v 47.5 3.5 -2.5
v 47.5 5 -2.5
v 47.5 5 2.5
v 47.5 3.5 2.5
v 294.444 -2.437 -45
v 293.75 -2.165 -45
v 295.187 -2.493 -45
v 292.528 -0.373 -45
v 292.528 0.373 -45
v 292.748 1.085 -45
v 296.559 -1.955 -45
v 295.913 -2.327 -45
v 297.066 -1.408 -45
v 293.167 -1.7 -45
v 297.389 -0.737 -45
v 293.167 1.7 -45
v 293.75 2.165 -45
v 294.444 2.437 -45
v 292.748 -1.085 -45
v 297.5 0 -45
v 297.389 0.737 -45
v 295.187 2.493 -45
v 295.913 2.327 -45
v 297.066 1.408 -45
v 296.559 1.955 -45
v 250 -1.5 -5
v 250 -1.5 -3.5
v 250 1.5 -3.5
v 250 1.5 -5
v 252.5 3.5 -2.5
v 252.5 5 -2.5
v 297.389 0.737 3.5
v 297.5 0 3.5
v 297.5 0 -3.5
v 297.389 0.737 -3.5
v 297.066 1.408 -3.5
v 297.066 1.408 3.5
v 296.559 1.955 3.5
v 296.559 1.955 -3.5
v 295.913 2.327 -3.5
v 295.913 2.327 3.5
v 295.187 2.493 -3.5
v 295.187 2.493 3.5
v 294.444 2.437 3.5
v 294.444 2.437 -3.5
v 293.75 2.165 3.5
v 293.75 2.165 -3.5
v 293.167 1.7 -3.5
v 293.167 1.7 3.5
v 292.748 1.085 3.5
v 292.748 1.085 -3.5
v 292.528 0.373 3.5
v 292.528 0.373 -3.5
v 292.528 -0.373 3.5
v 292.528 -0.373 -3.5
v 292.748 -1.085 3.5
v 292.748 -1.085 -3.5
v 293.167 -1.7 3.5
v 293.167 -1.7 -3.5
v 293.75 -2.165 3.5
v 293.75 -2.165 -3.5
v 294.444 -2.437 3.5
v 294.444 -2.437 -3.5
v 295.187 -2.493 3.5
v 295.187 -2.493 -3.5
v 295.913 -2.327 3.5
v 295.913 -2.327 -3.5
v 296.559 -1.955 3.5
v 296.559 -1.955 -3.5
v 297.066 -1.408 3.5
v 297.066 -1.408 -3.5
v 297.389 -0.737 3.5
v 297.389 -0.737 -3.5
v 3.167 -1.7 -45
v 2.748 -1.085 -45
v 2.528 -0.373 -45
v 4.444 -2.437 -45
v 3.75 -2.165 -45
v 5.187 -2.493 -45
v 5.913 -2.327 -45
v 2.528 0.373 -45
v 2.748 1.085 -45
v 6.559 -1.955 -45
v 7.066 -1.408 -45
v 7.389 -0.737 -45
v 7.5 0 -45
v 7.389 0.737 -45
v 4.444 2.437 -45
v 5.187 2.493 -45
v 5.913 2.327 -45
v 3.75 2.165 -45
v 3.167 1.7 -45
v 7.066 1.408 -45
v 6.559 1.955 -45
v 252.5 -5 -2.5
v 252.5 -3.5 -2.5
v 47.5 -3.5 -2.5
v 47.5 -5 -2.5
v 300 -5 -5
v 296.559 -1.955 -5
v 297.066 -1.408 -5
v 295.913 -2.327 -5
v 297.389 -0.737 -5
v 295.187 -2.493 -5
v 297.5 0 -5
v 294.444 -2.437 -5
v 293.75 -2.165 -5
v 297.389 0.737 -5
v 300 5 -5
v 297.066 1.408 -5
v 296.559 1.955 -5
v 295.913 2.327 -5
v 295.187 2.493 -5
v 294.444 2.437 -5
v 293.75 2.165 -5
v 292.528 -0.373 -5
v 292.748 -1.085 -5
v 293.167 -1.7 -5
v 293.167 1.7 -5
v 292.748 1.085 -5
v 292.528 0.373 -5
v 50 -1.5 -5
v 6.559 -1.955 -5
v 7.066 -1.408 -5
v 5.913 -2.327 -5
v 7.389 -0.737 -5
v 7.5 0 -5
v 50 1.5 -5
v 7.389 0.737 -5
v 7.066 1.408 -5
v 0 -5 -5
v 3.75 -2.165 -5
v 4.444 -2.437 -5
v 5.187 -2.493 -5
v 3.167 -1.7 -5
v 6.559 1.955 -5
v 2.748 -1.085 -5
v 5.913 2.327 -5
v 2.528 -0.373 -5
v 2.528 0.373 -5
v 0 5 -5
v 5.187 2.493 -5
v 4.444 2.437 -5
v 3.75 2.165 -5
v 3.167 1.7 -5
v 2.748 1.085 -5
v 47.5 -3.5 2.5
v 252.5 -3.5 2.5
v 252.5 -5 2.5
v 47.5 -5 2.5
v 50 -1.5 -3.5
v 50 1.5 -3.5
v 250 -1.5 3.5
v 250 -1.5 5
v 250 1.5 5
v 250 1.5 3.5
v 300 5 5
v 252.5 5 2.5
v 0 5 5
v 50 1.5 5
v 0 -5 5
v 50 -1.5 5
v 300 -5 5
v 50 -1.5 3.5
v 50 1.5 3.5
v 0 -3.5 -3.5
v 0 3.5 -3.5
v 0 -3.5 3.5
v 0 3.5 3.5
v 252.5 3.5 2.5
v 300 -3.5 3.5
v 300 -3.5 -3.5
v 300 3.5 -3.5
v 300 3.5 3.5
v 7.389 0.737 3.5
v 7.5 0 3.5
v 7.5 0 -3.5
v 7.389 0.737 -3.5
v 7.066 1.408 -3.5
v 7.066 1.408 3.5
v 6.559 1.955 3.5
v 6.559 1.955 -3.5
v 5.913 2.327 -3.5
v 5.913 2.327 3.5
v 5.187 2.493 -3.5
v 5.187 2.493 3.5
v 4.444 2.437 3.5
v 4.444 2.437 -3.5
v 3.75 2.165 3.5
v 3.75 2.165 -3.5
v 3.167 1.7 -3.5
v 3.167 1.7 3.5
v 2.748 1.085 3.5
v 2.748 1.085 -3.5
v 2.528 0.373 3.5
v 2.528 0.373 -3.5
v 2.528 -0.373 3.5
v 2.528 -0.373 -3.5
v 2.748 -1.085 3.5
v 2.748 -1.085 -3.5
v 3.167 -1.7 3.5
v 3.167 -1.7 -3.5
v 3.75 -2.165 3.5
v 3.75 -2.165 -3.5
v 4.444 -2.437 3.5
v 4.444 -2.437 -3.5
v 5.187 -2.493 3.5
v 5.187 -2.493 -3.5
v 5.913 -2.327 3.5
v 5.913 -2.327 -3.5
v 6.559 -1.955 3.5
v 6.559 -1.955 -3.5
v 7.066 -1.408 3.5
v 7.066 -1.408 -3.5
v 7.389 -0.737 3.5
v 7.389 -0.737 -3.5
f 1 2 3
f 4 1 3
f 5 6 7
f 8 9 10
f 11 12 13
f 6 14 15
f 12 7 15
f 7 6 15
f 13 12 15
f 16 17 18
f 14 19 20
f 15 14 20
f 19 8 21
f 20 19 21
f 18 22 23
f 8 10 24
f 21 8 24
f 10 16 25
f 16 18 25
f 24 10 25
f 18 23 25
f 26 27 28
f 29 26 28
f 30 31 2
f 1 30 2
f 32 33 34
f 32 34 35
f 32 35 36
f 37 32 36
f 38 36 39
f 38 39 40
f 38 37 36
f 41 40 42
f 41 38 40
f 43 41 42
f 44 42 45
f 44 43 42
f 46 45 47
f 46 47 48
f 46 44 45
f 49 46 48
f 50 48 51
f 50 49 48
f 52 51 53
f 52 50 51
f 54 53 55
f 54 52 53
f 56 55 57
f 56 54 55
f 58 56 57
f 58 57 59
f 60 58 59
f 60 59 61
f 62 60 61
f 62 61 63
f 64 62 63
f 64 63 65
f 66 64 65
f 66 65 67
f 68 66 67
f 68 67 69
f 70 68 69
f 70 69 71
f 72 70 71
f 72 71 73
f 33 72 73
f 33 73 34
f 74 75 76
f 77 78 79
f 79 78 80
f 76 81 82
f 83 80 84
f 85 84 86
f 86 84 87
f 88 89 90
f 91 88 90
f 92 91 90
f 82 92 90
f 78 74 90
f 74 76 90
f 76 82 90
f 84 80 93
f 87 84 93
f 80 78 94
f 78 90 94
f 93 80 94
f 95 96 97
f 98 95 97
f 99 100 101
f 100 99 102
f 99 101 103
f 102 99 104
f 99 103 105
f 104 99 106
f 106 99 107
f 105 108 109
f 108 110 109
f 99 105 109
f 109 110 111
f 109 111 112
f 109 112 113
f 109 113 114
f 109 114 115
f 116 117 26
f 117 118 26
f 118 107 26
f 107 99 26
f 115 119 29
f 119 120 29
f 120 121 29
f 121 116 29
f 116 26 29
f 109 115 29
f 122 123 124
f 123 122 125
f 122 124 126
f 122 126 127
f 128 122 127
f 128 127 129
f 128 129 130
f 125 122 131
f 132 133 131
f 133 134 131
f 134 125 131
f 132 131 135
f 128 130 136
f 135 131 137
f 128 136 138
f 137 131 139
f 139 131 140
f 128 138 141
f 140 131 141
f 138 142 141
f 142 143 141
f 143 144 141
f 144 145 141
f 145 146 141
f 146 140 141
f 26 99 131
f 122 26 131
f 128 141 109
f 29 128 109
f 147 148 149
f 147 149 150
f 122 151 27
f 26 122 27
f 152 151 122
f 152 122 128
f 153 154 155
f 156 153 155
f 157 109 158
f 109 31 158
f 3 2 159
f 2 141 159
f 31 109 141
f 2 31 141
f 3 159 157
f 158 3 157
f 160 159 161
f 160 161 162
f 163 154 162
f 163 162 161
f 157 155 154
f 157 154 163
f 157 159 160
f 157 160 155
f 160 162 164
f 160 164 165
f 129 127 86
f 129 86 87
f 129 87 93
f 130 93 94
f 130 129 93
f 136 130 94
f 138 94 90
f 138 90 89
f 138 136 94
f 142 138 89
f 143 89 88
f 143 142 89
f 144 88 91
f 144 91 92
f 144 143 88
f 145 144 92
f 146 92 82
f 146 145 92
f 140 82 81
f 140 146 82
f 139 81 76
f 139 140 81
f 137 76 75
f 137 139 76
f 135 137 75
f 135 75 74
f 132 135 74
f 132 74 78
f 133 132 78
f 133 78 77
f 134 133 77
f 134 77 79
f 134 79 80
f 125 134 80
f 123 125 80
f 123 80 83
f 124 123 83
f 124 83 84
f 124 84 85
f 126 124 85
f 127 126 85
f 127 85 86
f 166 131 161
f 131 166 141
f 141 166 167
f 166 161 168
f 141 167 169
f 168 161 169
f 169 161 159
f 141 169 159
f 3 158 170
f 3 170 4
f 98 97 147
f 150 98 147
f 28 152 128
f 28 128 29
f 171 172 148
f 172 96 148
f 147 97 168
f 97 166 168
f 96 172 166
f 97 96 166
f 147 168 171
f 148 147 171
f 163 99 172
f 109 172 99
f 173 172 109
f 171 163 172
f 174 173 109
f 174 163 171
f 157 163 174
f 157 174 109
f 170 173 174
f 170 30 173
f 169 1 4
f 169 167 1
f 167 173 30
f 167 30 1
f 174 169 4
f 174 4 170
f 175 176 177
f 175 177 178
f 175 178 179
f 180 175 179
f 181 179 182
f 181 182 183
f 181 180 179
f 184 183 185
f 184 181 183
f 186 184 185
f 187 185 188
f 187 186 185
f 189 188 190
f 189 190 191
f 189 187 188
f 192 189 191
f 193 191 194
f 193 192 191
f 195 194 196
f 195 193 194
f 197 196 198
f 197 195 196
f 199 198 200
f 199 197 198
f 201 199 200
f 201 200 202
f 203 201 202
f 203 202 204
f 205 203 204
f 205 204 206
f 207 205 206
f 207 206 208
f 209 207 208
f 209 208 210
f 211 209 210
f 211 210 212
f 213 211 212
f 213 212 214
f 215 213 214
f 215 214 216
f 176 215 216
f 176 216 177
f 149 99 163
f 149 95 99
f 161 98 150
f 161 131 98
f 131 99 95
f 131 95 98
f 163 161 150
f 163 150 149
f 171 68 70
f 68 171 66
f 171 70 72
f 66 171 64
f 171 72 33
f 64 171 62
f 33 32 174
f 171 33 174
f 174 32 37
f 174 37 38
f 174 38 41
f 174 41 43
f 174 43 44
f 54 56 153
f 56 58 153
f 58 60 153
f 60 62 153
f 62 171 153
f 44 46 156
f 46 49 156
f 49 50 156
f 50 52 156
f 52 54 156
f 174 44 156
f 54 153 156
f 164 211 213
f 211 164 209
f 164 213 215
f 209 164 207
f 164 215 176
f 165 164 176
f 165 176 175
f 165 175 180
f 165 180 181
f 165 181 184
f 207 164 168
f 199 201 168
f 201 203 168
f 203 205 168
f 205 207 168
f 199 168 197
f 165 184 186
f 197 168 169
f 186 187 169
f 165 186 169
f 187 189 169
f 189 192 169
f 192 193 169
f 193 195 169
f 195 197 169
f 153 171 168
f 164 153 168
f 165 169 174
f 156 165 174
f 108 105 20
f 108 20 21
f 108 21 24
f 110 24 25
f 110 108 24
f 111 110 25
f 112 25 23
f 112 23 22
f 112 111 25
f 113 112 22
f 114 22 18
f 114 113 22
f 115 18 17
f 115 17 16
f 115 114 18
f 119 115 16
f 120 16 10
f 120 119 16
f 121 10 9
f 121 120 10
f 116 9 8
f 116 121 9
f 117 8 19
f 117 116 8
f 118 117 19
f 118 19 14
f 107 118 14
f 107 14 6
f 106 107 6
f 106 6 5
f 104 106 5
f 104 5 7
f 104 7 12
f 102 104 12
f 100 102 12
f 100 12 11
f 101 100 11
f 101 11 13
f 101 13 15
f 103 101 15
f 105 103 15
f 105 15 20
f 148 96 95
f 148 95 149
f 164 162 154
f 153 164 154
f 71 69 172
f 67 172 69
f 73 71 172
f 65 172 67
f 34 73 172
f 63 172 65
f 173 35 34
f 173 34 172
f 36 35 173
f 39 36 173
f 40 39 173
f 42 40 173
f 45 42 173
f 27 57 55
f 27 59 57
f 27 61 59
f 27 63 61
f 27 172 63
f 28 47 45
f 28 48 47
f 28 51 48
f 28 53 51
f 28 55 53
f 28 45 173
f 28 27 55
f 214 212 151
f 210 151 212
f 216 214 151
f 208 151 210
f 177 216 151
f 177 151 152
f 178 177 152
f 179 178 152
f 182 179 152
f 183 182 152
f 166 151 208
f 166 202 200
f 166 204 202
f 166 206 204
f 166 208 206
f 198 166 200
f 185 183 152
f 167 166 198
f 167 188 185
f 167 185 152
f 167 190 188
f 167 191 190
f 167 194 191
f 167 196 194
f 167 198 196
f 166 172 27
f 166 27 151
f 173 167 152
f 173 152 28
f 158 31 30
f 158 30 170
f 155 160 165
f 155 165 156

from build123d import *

# Parameters (mm, degrees)
SKETCH13_W          = 10
SKETCH13_H          = 10
SKETCH13_W_2        = 7
SKETCH13_H_2        = 7
BOSS_EXTRUDE1_DEPTH = 300
SKETCH15_W          = 205
SKETCH15_H          = 5
CUT_EXTRUDE1_DEPTH  = 740
SKETCH16_R          = 2.5
BOSS_EXTRUDE3_DEPTH = 50
SKETCH17_W          = 200
SKETCH17_H          = 3
CUT_EXTRUDE2_DEPTH  = 70


with BuildPart() as part:
    # Sketch13 → Boss-Extrude1 (new body)
    with BuildSketch(Plane.YZ):
        Rectangle(SKETCH13_W, SKETCH13_H)
        Rectangle(SKETCH13_W_2, SKETCH13_H_2, mode=Mode.SUBTRACT)
    extrude(amount=BOSS_EXTRUDE1_DEPTH)

    # Sketch15 → Cut-Extrude1 (cut)
    with BuildSketch(Plane(origin=(0, 5, 0), x_dir=(-1, 0, 0), z_dir=(0, 1, 0))):
        with Locations((-150, 0)):
            Rectangle(SKETCH15_W, SKETCH15_H)
    extrude(amount=-CUT_EXTRUDE1_DEPTH, mode=Mode.SUBTRACT)

    # Sketch16 → Boss-Extrude3 (add)
    with BuildSketch(Plane.XY.offset(5)):
        with Locations((5, 0)):
            Circle(SKETCH16_R)
        with Locations((295, 0)):
            Circle(SKETCH16_R)
    extrude(amount=-BOSS_EXTRUDE3_DEPTH)

    # Sketch17 → Cut-Extrude2 (cut)
    with BuildSketch(Plane.XY.offset(5)):
        with Locations((150, 0)):
            Rectangle(SKETCH17_W, SKETCH17_H)
    extrude(amount=-CUT_EXTRUDE2_DEPTH, mode=Mode.SUBTRACT)


solid = part.part
